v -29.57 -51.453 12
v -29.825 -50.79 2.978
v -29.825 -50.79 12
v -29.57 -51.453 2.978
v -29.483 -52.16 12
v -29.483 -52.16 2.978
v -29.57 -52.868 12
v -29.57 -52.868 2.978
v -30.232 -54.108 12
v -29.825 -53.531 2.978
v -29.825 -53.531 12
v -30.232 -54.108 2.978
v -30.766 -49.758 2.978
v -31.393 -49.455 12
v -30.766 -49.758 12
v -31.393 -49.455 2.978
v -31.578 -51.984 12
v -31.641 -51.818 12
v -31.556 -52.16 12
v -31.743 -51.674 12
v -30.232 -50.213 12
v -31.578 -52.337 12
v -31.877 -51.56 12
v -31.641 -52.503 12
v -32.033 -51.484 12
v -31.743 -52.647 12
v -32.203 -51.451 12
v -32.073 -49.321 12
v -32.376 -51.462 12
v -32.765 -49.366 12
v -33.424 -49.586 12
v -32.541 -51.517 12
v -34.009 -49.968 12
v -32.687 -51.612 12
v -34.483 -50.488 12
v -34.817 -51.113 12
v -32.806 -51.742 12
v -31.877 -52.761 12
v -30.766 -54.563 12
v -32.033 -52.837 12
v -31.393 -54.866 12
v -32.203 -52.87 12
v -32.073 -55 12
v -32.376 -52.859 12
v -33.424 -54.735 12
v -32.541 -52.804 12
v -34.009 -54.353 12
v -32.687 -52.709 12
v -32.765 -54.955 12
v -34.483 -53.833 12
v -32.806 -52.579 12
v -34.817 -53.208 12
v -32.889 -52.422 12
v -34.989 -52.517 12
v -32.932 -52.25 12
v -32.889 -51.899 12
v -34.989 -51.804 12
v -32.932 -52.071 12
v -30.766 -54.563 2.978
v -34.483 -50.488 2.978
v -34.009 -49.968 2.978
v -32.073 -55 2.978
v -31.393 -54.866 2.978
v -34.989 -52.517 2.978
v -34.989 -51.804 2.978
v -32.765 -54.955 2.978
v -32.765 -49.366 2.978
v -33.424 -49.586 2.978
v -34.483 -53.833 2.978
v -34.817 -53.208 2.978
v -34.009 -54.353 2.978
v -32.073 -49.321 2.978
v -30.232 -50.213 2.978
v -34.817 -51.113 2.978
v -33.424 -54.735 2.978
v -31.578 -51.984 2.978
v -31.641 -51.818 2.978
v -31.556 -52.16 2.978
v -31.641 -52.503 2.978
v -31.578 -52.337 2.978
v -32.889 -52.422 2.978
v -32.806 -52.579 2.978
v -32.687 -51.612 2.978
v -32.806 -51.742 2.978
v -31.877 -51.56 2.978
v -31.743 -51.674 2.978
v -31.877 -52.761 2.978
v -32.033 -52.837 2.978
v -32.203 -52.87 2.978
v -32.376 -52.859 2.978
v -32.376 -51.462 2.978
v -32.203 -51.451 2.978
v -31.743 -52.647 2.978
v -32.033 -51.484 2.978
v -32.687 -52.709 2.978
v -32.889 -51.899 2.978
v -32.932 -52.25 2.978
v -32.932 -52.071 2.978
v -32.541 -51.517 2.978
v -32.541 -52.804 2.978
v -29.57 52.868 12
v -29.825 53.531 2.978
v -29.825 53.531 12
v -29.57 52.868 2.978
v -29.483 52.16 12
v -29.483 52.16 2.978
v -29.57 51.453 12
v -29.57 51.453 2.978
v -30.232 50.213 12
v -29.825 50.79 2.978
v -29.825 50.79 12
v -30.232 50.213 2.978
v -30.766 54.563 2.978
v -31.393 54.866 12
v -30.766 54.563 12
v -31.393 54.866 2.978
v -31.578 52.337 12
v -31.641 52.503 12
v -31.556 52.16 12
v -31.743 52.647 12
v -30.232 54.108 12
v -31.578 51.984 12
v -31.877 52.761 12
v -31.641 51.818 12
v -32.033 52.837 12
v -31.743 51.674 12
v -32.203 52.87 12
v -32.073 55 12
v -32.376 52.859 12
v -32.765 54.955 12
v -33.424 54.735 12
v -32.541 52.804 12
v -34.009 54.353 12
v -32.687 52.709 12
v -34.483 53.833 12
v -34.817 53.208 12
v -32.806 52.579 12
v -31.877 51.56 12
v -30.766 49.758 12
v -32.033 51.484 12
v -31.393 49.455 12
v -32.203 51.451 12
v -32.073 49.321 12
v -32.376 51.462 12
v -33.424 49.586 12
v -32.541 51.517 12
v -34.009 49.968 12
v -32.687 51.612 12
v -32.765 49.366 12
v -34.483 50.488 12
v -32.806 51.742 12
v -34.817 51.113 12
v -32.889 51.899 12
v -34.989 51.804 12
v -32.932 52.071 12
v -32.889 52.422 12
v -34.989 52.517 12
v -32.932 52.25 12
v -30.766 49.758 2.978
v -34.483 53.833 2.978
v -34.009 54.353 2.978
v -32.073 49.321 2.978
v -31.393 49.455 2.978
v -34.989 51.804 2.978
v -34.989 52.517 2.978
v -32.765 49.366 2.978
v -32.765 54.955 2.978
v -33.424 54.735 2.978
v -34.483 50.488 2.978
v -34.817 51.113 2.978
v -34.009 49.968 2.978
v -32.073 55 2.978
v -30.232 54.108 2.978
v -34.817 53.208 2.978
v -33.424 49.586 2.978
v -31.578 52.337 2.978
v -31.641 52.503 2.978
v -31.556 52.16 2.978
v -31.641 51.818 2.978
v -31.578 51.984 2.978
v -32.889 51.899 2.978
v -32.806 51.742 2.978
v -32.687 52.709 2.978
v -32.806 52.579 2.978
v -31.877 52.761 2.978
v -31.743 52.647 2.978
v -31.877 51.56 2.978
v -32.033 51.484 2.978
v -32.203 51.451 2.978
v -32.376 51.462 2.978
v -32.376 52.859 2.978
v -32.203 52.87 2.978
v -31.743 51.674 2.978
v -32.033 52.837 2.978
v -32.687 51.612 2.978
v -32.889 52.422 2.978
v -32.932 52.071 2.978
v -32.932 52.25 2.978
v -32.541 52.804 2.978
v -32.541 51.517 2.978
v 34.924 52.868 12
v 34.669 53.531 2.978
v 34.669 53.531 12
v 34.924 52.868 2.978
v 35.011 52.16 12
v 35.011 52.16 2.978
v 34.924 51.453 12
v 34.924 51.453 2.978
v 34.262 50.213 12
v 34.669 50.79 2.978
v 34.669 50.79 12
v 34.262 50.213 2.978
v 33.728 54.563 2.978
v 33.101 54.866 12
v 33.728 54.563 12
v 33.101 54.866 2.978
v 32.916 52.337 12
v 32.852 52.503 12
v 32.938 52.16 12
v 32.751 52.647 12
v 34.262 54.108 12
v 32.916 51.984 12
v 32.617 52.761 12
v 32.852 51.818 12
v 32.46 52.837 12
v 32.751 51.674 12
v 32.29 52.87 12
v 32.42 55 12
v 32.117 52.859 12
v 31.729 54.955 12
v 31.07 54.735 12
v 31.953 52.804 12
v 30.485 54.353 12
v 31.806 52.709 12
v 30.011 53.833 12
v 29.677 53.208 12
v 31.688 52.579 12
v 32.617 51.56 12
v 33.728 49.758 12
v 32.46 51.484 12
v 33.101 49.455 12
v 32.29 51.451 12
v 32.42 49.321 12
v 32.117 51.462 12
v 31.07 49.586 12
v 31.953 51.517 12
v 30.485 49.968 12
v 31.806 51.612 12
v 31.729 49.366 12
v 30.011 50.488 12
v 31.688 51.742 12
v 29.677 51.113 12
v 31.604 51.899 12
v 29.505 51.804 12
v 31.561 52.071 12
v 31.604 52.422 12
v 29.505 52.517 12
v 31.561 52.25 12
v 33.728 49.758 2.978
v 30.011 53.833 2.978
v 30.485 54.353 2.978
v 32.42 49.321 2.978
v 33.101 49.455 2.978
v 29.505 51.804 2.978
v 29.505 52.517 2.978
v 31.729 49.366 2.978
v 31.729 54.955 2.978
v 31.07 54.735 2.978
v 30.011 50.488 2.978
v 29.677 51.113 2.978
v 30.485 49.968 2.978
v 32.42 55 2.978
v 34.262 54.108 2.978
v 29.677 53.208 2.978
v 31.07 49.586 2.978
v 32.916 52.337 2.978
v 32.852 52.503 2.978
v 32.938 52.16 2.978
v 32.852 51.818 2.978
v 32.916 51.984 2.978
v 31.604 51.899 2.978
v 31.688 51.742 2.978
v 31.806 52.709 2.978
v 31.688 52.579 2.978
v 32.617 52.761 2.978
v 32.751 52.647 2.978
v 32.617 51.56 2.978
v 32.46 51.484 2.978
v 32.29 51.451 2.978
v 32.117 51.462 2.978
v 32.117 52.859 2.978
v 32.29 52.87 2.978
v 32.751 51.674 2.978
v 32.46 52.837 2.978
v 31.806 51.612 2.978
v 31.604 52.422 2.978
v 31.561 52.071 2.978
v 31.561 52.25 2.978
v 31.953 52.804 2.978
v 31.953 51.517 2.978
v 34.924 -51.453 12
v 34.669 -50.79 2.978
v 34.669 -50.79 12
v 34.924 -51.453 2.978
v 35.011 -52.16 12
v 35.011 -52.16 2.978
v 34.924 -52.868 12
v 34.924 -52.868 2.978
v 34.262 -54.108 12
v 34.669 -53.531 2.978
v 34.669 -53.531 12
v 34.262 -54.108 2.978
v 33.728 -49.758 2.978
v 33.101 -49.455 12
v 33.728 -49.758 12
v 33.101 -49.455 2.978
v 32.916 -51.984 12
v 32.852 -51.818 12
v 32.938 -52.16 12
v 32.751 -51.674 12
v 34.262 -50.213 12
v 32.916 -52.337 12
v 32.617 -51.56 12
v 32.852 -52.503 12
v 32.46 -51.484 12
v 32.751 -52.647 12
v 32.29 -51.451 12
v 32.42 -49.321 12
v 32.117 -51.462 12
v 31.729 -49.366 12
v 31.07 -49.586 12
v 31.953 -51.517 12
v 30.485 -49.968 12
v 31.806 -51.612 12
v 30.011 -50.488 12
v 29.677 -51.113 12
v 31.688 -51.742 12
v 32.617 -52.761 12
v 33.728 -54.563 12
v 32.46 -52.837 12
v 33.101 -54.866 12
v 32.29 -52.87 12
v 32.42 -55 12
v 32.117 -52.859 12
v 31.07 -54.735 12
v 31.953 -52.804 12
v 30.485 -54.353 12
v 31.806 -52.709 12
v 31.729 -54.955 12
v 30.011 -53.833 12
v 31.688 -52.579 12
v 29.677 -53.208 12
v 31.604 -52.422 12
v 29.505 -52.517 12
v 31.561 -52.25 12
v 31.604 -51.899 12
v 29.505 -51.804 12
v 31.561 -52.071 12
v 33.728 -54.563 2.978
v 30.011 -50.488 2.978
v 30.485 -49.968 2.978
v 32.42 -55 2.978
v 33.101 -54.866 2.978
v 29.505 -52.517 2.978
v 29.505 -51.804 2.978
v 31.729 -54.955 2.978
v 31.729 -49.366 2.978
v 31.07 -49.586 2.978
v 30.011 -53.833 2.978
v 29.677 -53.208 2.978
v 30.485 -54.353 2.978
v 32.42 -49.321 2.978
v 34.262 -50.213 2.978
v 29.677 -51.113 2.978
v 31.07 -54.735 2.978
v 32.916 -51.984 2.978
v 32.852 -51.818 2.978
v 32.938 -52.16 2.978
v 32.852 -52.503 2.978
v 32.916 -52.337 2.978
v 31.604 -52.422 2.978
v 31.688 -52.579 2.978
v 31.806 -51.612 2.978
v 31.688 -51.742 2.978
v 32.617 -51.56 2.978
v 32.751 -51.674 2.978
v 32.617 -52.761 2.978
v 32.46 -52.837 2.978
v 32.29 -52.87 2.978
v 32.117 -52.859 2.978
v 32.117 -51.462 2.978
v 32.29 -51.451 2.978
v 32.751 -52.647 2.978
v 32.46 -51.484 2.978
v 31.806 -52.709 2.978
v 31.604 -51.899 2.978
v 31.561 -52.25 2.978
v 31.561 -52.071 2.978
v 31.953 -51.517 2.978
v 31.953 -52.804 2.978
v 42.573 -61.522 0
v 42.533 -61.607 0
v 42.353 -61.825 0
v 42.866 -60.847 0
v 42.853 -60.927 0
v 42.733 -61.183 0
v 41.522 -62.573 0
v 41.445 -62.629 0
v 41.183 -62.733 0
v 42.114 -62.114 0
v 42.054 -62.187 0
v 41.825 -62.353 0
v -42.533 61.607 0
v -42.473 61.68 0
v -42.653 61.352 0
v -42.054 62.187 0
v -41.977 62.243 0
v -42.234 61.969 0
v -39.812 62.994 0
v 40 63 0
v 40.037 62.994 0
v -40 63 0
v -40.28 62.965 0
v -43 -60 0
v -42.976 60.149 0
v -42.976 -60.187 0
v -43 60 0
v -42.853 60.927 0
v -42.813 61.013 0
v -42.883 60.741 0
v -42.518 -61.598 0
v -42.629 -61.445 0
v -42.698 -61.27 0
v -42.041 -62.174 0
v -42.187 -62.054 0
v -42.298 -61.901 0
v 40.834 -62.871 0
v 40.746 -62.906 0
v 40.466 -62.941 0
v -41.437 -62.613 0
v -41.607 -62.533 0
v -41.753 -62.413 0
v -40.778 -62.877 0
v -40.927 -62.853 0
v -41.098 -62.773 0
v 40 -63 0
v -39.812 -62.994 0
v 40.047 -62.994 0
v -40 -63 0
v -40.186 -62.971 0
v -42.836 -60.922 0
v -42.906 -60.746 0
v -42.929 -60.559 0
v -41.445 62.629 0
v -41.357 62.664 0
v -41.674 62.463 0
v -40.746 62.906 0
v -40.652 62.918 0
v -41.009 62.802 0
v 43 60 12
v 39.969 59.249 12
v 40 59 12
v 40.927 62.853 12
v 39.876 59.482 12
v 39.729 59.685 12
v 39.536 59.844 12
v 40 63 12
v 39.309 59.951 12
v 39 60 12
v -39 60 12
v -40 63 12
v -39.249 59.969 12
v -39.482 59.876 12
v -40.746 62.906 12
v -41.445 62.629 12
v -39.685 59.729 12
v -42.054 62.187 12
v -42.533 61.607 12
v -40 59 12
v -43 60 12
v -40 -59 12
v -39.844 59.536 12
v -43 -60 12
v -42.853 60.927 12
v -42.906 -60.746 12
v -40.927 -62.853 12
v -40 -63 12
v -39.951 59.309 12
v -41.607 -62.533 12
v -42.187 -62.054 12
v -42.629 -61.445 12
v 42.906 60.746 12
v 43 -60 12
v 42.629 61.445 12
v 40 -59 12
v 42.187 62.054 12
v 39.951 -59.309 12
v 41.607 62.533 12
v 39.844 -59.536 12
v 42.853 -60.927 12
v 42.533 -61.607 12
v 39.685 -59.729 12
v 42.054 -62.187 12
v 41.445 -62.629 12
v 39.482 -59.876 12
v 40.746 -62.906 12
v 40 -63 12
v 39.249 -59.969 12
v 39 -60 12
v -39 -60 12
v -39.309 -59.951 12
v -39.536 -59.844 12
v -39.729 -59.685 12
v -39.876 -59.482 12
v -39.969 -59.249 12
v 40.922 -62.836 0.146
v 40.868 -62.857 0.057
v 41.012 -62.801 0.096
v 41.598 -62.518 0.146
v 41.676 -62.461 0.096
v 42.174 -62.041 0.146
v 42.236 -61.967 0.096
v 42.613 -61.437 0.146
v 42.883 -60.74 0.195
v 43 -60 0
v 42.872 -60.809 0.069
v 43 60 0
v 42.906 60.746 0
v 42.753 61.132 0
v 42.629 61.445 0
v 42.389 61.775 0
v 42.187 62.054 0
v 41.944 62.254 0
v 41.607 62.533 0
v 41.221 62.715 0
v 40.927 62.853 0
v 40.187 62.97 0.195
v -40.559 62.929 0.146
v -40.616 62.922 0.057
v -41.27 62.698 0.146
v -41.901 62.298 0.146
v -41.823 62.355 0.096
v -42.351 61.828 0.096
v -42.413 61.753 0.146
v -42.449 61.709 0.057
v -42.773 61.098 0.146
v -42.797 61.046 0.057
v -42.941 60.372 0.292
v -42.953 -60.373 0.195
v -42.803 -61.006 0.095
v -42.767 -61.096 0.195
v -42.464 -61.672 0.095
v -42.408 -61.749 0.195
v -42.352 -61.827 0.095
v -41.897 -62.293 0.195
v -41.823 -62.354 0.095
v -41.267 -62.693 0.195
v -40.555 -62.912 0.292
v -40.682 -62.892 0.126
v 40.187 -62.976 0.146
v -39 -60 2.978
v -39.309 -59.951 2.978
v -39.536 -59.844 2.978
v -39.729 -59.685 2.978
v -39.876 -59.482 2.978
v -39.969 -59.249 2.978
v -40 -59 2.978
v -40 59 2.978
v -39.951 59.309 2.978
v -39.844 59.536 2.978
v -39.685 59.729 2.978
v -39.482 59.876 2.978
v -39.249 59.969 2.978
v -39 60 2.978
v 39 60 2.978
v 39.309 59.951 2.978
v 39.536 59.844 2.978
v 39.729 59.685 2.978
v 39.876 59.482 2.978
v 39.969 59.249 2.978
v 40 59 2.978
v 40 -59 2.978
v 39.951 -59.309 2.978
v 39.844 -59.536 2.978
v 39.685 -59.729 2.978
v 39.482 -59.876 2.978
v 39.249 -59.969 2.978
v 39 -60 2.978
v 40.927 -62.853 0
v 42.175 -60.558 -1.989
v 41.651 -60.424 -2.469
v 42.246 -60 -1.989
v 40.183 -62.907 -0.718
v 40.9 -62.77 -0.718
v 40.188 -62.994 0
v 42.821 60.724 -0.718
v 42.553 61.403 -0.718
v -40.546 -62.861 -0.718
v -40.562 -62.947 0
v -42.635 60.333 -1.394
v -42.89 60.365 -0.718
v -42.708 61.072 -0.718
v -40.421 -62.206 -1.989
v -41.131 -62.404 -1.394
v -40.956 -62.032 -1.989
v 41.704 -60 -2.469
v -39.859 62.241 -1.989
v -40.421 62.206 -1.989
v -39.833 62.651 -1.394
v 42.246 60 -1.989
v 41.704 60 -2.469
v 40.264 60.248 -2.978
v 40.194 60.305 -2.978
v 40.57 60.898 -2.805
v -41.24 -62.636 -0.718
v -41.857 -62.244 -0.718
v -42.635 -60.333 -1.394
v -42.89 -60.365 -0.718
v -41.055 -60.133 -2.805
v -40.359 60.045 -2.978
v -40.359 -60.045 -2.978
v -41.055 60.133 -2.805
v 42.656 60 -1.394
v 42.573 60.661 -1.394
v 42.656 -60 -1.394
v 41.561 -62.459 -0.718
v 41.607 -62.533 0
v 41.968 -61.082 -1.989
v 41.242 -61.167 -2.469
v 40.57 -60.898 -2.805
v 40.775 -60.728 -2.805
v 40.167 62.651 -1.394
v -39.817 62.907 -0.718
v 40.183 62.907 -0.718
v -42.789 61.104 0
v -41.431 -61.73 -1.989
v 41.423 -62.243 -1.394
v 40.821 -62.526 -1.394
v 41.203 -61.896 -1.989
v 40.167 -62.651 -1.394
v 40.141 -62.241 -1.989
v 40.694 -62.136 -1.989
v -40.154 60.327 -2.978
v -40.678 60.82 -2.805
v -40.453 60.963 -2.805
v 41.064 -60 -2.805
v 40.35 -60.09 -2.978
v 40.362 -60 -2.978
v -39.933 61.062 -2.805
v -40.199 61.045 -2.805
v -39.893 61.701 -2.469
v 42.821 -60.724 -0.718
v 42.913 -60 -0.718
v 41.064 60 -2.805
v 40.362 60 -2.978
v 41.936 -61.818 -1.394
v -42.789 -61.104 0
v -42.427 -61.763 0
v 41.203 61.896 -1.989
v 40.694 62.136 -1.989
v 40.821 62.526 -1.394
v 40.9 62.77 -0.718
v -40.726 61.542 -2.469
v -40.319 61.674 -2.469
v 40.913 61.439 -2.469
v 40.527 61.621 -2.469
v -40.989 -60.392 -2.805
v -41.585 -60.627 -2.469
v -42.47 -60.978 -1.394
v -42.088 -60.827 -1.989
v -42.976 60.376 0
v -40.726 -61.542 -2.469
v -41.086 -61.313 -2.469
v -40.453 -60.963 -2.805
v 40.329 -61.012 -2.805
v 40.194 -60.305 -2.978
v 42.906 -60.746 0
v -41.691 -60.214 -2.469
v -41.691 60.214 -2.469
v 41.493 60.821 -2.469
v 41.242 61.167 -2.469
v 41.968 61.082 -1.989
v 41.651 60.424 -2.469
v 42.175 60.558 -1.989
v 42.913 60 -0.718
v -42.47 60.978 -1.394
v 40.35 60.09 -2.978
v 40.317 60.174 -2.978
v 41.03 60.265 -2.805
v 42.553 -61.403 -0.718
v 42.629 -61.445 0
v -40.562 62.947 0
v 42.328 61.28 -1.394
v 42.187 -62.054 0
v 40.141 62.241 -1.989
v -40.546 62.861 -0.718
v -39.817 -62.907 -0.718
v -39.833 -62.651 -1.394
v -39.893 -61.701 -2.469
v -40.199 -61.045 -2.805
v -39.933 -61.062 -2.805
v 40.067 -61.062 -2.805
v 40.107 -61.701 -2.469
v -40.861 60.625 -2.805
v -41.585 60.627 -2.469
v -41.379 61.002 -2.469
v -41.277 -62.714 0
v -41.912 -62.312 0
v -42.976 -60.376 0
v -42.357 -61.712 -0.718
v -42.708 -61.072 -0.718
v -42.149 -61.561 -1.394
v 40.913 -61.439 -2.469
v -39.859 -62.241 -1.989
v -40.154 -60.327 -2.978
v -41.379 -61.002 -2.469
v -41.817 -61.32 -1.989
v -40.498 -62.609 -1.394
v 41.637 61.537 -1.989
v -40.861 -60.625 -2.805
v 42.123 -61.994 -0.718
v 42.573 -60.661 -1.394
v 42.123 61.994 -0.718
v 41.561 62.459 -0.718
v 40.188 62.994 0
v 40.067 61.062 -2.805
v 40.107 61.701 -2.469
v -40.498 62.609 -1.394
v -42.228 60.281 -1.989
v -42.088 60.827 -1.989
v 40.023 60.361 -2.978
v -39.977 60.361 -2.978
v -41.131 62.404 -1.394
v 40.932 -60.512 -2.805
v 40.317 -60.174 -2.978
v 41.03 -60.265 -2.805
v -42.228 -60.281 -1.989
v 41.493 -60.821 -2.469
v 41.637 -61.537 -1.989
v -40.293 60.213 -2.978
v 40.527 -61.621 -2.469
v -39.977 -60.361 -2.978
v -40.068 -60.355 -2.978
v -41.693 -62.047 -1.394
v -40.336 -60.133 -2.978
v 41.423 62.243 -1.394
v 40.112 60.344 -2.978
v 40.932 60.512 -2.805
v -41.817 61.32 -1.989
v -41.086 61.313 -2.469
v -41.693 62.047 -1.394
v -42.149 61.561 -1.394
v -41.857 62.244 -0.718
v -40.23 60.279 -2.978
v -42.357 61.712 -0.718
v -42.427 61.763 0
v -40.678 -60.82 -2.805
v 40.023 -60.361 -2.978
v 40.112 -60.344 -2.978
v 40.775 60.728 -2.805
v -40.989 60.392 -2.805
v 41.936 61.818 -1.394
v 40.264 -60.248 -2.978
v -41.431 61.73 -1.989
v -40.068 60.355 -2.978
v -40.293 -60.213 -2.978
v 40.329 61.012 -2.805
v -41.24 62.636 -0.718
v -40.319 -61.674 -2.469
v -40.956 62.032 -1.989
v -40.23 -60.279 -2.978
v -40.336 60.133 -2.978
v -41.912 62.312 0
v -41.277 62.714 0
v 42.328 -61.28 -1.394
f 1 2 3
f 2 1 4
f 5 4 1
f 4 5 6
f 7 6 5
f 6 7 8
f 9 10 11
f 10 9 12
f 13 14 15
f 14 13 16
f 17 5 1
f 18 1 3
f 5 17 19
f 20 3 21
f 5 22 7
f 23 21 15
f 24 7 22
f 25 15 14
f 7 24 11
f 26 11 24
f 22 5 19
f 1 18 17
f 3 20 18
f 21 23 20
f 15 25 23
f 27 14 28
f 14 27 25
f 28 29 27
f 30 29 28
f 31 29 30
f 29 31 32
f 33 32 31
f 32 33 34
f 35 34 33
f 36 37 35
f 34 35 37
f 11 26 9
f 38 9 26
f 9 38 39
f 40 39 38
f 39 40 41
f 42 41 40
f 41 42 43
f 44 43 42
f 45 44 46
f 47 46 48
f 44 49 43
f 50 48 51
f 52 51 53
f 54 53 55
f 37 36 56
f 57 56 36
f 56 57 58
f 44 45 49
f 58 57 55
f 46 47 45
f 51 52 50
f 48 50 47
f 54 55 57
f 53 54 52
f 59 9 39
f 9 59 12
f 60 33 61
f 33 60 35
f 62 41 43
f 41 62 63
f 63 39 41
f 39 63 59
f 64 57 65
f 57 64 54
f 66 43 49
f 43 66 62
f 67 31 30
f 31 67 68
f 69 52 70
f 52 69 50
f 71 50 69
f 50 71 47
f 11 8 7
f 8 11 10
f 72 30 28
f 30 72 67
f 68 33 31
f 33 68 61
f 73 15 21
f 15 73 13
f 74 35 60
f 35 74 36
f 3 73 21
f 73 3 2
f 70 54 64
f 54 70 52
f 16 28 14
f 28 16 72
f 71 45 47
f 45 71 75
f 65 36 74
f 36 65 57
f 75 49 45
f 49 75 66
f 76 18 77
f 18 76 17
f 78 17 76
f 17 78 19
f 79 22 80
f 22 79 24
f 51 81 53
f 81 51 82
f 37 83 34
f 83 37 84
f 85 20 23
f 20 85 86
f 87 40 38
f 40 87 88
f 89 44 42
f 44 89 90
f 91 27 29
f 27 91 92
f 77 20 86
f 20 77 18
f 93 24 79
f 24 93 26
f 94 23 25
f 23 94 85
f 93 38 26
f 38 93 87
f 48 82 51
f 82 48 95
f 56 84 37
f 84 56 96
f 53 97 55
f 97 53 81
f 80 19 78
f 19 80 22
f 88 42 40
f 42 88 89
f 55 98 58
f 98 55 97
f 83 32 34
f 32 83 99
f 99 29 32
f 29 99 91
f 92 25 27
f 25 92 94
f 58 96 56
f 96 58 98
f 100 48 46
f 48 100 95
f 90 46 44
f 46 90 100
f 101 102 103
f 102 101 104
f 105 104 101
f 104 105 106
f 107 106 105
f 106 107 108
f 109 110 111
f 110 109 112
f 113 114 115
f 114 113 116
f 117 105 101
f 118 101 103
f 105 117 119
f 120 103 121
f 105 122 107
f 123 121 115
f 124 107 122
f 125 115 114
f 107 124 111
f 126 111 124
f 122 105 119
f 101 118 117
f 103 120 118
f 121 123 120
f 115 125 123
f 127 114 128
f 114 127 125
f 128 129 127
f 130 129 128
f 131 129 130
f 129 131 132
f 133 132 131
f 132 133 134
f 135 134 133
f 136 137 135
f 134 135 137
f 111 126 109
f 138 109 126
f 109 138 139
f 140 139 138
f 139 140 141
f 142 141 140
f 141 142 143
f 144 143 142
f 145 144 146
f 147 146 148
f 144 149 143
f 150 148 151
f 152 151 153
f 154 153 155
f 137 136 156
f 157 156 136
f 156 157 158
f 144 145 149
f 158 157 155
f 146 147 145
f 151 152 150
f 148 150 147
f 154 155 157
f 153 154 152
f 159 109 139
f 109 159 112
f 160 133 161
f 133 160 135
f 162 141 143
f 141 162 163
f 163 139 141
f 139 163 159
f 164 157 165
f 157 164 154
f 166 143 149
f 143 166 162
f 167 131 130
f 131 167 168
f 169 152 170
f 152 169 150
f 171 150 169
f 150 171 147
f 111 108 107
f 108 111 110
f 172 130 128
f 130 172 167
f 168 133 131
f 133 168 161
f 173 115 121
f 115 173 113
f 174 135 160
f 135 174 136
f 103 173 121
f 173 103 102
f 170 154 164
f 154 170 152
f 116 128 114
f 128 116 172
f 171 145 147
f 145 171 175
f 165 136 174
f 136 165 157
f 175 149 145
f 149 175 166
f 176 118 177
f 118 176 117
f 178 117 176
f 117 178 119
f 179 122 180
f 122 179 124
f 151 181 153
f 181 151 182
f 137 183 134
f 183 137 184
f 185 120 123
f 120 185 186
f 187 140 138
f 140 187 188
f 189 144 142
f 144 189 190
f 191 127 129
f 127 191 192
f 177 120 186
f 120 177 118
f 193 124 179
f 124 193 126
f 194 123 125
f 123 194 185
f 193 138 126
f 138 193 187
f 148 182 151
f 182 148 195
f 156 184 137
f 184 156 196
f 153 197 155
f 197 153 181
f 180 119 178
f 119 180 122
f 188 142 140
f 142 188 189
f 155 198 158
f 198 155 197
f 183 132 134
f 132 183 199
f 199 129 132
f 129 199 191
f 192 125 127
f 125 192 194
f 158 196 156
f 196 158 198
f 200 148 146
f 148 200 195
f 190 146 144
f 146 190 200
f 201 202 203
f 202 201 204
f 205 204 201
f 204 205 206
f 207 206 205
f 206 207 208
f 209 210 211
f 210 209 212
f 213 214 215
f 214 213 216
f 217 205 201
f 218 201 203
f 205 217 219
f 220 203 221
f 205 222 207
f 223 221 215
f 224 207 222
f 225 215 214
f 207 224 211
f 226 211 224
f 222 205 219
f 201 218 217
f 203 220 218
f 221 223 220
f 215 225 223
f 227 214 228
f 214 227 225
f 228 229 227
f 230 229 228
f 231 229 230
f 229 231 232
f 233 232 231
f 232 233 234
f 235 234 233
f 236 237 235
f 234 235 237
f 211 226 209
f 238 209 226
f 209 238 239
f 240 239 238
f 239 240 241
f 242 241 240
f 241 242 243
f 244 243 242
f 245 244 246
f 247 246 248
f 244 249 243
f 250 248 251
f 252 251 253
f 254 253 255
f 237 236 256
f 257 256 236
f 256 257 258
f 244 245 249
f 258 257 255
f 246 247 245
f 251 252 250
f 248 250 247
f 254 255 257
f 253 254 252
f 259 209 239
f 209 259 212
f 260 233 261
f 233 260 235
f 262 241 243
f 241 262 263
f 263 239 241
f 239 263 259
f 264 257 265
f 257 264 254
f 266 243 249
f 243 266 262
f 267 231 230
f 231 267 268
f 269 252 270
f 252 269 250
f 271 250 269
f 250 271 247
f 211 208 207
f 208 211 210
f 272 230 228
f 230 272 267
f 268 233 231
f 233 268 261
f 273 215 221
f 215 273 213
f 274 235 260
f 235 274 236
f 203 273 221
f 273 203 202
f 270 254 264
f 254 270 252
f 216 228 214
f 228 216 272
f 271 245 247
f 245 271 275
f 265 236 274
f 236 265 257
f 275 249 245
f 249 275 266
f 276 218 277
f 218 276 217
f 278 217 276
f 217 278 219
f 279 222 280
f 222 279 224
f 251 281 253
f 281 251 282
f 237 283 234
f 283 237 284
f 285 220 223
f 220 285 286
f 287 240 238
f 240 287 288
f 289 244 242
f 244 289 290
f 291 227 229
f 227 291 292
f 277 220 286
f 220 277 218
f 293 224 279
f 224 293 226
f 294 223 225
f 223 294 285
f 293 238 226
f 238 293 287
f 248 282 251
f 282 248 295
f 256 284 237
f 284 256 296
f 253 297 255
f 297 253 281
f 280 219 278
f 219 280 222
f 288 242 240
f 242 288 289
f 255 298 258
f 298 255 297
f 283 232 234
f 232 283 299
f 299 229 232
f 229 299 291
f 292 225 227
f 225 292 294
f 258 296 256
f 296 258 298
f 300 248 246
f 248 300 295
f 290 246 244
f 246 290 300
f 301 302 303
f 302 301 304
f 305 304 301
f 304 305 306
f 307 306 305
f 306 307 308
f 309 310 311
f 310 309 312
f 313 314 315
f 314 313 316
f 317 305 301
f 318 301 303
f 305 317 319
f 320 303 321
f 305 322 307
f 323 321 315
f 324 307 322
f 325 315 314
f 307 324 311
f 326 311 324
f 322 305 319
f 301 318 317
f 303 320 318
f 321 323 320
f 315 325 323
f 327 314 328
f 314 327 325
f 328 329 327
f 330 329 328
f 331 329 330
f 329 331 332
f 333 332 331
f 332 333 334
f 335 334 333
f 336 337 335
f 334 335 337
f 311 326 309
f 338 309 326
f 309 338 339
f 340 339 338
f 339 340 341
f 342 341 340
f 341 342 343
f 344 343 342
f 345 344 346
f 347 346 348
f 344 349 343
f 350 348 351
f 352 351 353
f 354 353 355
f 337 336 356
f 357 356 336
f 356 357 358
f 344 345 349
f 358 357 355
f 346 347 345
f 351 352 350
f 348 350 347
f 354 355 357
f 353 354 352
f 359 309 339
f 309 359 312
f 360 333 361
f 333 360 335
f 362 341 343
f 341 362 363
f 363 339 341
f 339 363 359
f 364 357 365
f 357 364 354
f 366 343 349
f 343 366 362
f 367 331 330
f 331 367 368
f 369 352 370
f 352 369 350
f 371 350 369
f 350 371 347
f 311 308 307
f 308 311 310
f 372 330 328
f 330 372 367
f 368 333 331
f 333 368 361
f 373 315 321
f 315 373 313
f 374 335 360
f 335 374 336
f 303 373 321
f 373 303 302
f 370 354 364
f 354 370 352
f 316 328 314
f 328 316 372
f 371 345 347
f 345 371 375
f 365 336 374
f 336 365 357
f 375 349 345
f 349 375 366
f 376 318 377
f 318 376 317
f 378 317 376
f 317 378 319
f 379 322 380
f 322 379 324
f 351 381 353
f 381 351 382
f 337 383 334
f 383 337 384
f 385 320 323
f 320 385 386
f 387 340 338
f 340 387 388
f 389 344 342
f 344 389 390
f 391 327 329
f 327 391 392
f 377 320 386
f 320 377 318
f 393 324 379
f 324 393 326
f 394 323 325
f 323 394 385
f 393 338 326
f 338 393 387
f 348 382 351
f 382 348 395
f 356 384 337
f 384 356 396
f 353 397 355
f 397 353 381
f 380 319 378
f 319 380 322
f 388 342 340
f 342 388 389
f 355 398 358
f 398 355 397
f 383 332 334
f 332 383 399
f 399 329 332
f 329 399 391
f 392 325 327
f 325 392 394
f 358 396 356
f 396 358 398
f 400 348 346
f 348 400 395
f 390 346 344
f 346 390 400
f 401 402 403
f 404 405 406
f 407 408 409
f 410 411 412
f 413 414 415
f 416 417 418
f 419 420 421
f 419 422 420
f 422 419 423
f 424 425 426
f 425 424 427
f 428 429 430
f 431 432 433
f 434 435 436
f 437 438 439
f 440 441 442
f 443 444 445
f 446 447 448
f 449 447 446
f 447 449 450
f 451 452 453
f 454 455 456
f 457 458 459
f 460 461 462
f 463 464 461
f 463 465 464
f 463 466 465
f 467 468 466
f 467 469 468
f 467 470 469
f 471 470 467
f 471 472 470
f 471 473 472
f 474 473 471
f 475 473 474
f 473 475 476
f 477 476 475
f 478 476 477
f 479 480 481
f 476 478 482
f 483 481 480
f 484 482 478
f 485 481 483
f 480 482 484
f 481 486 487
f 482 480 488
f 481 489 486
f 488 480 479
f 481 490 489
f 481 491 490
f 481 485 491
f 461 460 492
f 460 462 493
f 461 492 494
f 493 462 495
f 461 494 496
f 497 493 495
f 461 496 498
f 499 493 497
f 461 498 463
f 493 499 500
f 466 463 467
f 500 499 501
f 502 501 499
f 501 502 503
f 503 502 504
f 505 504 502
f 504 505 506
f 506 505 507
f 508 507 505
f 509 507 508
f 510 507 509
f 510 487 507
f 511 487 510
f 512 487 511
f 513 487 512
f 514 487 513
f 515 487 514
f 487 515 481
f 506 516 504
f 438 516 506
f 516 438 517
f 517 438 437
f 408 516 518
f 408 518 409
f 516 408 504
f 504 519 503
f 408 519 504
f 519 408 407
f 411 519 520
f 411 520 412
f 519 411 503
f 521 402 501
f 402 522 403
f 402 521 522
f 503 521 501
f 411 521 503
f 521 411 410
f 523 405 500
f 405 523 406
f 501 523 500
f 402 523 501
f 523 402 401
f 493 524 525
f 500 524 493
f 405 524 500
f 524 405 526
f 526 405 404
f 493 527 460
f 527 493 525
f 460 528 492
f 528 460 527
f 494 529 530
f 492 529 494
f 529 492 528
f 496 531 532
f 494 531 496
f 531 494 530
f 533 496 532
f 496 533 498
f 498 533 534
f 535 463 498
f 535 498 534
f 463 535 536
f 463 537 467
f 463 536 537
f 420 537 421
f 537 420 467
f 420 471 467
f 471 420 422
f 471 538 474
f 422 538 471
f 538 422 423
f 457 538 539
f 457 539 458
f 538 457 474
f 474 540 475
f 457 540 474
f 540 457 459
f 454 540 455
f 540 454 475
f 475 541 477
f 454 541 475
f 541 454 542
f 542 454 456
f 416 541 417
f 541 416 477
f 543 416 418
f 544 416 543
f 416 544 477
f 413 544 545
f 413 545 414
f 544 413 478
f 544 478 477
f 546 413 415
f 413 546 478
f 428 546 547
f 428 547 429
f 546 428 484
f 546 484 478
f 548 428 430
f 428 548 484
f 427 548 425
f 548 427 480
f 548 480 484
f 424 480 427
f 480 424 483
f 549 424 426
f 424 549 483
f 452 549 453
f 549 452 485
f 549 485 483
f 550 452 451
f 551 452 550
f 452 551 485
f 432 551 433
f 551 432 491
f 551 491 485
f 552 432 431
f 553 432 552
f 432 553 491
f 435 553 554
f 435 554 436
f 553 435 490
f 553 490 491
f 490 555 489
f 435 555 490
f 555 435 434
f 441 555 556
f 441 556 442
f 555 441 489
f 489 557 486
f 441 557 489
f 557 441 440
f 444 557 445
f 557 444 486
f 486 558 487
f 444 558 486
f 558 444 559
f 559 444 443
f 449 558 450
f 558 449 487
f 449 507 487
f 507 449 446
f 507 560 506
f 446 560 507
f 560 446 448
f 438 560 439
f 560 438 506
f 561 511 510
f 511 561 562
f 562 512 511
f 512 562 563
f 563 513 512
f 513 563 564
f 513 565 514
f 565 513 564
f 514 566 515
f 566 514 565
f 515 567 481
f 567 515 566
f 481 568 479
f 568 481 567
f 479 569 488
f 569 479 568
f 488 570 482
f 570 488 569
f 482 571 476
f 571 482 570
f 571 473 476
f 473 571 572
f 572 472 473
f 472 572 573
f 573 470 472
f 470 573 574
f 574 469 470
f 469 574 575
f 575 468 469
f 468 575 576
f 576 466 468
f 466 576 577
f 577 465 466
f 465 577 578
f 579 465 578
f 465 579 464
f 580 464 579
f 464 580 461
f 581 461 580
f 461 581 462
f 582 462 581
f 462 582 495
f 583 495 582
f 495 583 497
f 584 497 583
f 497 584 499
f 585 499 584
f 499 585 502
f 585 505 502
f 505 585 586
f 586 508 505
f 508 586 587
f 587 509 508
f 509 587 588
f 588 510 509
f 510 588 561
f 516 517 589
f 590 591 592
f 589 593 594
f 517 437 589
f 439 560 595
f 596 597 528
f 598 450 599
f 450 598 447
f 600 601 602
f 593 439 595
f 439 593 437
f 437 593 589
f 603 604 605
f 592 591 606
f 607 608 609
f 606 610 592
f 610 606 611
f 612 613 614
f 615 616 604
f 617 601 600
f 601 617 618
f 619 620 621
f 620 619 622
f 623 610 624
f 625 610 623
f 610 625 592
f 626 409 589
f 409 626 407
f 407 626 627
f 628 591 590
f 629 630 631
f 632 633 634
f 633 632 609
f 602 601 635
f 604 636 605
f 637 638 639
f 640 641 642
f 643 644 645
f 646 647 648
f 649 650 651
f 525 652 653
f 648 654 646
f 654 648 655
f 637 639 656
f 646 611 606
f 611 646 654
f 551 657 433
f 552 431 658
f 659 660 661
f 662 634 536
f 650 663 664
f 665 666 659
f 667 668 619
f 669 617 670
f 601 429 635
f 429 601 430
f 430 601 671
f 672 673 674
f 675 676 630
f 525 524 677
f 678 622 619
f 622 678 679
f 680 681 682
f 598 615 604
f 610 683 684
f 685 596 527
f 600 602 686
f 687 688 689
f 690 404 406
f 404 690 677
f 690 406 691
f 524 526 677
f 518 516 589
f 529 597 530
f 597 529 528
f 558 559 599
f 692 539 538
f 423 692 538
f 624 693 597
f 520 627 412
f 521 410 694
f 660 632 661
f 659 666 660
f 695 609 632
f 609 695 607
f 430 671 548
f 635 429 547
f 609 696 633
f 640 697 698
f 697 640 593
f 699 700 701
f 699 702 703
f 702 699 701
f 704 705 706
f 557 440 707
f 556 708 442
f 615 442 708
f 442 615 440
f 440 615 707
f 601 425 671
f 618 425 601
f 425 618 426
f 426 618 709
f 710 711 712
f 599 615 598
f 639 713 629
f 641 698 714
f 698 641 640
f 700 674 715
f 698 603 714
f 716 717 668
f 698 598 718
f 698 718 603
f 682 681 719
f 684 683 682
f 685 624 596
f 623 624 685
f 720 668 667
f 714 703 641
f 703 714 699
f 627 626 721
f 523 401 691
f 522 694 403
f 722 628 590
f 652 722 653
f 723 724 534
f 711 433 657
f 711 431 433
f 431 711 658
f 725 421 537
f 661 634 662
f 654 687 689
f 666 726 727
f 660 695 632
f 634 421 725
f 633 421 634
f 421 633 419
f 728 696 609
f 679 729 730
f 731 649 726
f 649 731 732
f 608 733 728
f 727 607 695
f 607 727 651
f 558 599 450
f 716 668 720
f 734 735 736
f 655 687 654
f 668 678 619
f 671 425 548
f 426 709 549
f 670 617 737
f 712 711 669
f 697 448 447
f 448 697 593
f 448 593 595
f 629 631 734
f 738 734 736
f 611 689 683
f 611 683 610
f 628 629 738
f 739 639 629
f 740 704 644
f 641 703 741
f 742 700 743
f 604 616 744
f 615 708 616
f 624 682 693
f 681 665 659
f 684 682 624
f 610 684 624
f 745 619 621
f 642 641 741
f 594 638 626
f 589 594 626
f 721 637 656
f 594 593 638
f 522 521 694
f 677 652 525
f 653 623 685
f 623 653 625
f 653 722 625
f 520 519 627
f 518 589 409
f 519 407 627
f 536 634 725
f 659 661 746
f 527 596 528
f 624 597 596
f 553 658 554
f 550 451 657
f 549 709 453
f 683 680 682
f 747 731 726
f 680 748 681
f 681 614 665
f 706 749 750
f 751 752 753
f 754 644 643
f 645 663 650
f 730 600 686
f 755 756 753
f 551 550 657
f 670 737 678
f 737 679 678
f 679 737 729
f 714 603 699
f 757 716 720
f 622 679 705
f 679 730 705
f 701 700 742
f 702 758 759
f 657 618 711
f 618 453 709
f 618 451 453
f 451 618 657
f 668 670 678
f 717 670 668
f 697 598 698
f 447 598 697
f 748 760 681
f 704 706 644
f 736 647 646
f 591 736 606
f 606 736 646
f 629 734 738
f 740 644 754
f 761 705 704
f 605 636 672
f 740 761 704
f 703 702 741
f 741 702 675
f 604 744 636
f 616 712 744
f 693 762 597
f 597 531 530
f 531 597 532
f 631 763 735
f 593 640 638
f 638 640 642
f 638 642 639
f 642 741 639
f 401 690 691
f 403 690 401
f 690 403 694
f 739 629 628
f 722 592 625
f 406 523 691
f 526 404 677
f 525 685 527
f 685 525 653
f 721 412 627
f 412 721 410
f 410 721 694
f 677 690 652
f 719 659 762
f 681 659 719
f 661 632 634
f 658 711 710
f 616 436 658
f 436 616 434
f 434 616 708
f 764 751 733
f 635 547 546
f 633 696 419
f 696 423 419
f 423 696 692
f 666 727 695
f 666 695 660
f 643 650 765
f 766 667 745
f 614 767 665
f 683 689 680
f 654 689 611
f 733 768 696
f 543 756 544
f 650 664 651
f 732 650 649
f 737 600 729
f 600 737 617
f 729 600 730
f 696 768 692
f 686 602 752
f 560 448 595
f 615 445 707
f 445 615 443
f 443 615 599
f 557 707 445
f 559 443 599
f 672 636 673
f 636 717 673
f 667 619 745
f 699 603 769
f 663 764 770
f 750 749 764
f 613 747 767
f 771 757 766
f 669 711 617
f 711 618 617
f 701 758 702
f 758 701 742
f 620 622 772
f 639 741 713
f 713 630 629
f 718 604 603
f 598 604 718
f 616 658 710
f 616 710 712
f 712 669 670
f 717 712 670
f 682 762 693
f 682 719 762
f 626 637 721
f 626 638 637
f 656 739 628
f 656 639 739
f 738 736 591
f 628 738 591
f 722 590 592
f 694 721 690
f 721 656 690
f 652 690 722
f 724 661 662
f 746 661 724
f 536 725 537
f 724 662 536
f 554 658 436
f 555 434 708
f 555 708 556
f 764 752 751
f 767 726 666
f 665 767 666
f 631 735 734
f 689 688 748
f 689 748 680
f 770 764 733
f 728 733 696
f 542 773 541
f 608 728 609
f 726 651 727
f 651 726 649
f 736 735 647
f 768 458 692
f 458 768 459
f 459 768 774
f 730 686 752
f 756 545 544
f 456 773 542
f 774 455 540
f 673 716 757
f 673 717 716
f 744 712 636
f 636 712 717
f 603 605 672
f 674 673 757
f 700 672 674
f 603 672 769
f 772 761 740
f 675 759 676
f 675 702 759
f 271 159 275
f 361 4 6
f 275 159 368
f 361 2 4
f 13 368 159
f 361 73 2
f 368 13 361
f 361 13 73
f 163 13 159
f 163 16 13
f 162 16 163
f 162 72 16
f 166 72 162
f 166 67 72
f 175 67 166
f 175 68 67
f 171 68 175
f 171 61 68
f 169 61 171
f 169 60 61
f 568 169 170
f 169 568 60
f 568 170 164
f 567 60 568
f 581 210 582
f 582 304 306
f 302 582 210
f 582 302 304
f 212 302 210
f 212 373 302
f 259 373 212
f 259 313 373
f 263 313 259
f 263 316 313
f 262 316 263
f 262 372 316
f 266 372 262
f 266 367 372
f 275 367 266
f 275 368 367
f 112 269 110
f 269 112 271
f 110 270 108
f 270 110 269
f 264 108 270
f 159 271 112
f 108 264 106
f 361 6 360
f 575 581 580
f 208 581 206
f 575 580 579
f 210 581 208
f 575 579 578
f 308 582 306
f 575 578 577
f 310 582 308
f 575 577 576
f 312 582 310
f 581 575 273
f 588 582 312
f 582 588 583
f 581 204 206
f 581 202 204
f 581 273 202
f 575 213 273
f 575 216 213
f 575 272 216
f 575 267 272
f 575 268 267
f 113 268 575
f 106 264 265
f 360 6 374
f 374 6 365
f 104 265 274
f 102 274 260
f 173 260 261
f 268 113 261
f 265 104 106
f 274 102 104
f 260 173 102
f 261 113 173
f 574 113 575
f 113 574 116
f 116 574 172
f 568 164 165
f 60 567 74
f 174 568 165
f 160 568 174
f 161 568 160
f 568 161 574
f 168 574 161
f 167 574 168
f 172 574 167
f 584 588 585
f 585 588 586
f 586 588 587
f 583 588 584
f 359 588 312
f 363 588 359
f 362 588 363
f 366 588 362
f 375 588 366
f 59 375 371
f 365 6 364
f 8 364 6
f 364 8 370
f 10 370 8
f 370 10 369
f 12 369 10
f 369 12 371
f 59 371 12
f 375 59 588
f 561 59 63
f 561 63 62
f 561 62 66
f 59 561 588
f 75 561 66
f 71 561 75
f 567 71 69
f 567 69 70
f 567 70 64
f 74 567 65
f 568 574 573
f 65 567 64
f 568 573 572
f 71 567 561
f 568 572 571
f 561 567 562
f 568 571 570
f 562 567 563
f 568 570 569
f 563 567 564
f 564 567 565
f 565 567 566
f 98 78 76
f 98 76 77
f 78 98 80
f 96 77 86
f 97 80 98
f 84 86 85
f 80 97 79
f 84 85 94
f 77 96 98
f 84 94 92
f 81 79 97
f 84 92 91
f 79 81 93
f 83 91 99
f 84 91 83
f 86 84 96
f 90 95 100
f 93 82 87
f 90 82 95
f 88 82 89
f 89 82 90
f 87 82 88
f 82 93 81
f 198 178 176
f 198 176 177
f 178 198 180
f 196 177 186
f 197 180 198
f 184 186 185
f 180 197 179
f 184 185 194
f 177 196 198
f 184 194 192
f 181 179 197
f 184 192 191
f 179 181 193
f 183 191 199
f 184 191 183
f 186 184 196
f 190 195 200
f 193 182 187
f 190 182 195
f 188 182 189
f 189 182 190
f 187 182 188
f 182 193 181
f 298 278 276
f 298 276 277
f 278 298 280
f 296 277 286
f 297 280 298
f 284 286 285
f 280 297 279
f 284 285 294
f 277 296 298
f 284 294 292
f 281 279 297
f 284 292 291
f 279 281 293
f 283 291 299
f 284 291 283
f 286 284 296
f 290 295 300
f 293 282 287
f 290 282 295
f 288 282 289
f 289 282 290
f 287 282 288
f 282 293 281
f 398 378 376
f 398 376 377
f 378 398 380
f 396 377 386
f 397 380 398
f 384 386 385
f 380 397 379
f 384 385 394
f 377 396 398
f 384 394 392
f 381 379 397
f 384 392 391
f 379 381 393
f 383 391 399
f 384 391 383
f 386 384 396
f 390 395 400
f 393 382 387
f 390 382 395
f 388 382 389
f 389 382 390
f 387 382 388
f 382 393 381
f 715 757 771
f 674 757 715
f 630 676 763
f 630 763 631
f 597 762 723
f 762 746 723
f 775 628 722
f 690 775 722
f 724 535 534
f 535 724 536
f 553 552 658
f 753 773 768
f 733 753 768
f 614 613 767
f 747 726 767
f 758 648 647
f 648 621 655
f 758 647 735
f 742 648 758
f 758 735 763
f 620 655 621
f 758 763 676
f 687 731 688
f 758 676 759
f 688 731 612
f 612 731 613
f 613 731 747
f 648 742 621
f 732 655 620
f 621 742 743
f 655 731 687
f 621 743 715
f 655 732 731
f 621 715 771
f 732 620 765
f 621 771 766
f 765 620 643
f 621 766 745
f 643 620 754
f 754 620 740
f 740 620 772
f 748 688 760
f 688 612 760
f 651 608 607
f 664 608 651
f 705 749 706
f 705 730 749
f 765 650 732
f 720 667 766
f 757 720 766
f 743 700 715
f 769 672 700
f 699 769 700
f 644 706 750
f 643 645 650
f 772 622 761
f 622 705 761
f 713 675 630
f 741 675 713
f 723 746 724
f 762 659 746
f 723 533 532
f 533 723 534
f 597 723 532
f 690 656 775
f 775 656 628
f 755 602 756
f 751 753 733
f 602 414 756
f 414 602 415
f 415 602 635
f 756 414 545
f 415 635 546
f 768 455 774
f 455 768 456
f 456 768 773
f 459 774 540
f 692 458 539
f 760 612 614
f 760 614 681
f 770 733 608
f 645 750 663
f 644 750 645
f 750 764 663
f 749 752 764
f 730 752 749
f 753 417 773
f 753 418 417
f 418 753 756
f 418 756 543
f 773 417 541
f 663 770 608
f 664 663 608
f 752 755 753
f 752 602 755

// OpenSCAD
$fn=25;
BOX_W = 80; // Box Width
BOX_L = 120;// Box Length
BOX_H = 12; // Box Height

SCREW_SIZE = 1.5; // Screw size radius.

CORNER_RADIUS = 3; // Radius of corners
WALL_THICKNESS = 2;// Wall Thickness

POST_OFFSET=10;

linear_extrude( BOX_H )
    difference(){
        offset(r=CORNER_RADIUS) 
            square( [BOX_W, BOX_L], center=true );
        
        offset( r= CORNER_RADIUS - WALL_THICKNESS )
            square( [BOX_W-WALL_THICKNESS, BOX_L-WALL_THICKNESS], center=true );
    }


coordinates = [ [0,0],[0,BOX_L],[BOX_W,BOX_L],[BOX_W,0] ];

translate ( [-BOX_W/2, -BOX_L/2] )
    hull()
    for (i = coordinates)
        translate(i) sphere(CORNER_RADIUS);

p_w = BOX_W - POST_OFFSET;
p_l = BOX_L - POST_OFFSET;

resize([p_w,p_l,0]) // Move the posts in from the edge
    translate([-BOX_W/2,-BOX_L/2,0])
       for (i = coordinates)
           translate(i)
           scale([BOX_W/p_w,BOX_L/p_l])
               difference(){
                 cylinder(h=BOX_H,r=CORNER_RADIUS);
                 cylinder(h=BOX_H,r=SCREW_SIZE/2);
               }
